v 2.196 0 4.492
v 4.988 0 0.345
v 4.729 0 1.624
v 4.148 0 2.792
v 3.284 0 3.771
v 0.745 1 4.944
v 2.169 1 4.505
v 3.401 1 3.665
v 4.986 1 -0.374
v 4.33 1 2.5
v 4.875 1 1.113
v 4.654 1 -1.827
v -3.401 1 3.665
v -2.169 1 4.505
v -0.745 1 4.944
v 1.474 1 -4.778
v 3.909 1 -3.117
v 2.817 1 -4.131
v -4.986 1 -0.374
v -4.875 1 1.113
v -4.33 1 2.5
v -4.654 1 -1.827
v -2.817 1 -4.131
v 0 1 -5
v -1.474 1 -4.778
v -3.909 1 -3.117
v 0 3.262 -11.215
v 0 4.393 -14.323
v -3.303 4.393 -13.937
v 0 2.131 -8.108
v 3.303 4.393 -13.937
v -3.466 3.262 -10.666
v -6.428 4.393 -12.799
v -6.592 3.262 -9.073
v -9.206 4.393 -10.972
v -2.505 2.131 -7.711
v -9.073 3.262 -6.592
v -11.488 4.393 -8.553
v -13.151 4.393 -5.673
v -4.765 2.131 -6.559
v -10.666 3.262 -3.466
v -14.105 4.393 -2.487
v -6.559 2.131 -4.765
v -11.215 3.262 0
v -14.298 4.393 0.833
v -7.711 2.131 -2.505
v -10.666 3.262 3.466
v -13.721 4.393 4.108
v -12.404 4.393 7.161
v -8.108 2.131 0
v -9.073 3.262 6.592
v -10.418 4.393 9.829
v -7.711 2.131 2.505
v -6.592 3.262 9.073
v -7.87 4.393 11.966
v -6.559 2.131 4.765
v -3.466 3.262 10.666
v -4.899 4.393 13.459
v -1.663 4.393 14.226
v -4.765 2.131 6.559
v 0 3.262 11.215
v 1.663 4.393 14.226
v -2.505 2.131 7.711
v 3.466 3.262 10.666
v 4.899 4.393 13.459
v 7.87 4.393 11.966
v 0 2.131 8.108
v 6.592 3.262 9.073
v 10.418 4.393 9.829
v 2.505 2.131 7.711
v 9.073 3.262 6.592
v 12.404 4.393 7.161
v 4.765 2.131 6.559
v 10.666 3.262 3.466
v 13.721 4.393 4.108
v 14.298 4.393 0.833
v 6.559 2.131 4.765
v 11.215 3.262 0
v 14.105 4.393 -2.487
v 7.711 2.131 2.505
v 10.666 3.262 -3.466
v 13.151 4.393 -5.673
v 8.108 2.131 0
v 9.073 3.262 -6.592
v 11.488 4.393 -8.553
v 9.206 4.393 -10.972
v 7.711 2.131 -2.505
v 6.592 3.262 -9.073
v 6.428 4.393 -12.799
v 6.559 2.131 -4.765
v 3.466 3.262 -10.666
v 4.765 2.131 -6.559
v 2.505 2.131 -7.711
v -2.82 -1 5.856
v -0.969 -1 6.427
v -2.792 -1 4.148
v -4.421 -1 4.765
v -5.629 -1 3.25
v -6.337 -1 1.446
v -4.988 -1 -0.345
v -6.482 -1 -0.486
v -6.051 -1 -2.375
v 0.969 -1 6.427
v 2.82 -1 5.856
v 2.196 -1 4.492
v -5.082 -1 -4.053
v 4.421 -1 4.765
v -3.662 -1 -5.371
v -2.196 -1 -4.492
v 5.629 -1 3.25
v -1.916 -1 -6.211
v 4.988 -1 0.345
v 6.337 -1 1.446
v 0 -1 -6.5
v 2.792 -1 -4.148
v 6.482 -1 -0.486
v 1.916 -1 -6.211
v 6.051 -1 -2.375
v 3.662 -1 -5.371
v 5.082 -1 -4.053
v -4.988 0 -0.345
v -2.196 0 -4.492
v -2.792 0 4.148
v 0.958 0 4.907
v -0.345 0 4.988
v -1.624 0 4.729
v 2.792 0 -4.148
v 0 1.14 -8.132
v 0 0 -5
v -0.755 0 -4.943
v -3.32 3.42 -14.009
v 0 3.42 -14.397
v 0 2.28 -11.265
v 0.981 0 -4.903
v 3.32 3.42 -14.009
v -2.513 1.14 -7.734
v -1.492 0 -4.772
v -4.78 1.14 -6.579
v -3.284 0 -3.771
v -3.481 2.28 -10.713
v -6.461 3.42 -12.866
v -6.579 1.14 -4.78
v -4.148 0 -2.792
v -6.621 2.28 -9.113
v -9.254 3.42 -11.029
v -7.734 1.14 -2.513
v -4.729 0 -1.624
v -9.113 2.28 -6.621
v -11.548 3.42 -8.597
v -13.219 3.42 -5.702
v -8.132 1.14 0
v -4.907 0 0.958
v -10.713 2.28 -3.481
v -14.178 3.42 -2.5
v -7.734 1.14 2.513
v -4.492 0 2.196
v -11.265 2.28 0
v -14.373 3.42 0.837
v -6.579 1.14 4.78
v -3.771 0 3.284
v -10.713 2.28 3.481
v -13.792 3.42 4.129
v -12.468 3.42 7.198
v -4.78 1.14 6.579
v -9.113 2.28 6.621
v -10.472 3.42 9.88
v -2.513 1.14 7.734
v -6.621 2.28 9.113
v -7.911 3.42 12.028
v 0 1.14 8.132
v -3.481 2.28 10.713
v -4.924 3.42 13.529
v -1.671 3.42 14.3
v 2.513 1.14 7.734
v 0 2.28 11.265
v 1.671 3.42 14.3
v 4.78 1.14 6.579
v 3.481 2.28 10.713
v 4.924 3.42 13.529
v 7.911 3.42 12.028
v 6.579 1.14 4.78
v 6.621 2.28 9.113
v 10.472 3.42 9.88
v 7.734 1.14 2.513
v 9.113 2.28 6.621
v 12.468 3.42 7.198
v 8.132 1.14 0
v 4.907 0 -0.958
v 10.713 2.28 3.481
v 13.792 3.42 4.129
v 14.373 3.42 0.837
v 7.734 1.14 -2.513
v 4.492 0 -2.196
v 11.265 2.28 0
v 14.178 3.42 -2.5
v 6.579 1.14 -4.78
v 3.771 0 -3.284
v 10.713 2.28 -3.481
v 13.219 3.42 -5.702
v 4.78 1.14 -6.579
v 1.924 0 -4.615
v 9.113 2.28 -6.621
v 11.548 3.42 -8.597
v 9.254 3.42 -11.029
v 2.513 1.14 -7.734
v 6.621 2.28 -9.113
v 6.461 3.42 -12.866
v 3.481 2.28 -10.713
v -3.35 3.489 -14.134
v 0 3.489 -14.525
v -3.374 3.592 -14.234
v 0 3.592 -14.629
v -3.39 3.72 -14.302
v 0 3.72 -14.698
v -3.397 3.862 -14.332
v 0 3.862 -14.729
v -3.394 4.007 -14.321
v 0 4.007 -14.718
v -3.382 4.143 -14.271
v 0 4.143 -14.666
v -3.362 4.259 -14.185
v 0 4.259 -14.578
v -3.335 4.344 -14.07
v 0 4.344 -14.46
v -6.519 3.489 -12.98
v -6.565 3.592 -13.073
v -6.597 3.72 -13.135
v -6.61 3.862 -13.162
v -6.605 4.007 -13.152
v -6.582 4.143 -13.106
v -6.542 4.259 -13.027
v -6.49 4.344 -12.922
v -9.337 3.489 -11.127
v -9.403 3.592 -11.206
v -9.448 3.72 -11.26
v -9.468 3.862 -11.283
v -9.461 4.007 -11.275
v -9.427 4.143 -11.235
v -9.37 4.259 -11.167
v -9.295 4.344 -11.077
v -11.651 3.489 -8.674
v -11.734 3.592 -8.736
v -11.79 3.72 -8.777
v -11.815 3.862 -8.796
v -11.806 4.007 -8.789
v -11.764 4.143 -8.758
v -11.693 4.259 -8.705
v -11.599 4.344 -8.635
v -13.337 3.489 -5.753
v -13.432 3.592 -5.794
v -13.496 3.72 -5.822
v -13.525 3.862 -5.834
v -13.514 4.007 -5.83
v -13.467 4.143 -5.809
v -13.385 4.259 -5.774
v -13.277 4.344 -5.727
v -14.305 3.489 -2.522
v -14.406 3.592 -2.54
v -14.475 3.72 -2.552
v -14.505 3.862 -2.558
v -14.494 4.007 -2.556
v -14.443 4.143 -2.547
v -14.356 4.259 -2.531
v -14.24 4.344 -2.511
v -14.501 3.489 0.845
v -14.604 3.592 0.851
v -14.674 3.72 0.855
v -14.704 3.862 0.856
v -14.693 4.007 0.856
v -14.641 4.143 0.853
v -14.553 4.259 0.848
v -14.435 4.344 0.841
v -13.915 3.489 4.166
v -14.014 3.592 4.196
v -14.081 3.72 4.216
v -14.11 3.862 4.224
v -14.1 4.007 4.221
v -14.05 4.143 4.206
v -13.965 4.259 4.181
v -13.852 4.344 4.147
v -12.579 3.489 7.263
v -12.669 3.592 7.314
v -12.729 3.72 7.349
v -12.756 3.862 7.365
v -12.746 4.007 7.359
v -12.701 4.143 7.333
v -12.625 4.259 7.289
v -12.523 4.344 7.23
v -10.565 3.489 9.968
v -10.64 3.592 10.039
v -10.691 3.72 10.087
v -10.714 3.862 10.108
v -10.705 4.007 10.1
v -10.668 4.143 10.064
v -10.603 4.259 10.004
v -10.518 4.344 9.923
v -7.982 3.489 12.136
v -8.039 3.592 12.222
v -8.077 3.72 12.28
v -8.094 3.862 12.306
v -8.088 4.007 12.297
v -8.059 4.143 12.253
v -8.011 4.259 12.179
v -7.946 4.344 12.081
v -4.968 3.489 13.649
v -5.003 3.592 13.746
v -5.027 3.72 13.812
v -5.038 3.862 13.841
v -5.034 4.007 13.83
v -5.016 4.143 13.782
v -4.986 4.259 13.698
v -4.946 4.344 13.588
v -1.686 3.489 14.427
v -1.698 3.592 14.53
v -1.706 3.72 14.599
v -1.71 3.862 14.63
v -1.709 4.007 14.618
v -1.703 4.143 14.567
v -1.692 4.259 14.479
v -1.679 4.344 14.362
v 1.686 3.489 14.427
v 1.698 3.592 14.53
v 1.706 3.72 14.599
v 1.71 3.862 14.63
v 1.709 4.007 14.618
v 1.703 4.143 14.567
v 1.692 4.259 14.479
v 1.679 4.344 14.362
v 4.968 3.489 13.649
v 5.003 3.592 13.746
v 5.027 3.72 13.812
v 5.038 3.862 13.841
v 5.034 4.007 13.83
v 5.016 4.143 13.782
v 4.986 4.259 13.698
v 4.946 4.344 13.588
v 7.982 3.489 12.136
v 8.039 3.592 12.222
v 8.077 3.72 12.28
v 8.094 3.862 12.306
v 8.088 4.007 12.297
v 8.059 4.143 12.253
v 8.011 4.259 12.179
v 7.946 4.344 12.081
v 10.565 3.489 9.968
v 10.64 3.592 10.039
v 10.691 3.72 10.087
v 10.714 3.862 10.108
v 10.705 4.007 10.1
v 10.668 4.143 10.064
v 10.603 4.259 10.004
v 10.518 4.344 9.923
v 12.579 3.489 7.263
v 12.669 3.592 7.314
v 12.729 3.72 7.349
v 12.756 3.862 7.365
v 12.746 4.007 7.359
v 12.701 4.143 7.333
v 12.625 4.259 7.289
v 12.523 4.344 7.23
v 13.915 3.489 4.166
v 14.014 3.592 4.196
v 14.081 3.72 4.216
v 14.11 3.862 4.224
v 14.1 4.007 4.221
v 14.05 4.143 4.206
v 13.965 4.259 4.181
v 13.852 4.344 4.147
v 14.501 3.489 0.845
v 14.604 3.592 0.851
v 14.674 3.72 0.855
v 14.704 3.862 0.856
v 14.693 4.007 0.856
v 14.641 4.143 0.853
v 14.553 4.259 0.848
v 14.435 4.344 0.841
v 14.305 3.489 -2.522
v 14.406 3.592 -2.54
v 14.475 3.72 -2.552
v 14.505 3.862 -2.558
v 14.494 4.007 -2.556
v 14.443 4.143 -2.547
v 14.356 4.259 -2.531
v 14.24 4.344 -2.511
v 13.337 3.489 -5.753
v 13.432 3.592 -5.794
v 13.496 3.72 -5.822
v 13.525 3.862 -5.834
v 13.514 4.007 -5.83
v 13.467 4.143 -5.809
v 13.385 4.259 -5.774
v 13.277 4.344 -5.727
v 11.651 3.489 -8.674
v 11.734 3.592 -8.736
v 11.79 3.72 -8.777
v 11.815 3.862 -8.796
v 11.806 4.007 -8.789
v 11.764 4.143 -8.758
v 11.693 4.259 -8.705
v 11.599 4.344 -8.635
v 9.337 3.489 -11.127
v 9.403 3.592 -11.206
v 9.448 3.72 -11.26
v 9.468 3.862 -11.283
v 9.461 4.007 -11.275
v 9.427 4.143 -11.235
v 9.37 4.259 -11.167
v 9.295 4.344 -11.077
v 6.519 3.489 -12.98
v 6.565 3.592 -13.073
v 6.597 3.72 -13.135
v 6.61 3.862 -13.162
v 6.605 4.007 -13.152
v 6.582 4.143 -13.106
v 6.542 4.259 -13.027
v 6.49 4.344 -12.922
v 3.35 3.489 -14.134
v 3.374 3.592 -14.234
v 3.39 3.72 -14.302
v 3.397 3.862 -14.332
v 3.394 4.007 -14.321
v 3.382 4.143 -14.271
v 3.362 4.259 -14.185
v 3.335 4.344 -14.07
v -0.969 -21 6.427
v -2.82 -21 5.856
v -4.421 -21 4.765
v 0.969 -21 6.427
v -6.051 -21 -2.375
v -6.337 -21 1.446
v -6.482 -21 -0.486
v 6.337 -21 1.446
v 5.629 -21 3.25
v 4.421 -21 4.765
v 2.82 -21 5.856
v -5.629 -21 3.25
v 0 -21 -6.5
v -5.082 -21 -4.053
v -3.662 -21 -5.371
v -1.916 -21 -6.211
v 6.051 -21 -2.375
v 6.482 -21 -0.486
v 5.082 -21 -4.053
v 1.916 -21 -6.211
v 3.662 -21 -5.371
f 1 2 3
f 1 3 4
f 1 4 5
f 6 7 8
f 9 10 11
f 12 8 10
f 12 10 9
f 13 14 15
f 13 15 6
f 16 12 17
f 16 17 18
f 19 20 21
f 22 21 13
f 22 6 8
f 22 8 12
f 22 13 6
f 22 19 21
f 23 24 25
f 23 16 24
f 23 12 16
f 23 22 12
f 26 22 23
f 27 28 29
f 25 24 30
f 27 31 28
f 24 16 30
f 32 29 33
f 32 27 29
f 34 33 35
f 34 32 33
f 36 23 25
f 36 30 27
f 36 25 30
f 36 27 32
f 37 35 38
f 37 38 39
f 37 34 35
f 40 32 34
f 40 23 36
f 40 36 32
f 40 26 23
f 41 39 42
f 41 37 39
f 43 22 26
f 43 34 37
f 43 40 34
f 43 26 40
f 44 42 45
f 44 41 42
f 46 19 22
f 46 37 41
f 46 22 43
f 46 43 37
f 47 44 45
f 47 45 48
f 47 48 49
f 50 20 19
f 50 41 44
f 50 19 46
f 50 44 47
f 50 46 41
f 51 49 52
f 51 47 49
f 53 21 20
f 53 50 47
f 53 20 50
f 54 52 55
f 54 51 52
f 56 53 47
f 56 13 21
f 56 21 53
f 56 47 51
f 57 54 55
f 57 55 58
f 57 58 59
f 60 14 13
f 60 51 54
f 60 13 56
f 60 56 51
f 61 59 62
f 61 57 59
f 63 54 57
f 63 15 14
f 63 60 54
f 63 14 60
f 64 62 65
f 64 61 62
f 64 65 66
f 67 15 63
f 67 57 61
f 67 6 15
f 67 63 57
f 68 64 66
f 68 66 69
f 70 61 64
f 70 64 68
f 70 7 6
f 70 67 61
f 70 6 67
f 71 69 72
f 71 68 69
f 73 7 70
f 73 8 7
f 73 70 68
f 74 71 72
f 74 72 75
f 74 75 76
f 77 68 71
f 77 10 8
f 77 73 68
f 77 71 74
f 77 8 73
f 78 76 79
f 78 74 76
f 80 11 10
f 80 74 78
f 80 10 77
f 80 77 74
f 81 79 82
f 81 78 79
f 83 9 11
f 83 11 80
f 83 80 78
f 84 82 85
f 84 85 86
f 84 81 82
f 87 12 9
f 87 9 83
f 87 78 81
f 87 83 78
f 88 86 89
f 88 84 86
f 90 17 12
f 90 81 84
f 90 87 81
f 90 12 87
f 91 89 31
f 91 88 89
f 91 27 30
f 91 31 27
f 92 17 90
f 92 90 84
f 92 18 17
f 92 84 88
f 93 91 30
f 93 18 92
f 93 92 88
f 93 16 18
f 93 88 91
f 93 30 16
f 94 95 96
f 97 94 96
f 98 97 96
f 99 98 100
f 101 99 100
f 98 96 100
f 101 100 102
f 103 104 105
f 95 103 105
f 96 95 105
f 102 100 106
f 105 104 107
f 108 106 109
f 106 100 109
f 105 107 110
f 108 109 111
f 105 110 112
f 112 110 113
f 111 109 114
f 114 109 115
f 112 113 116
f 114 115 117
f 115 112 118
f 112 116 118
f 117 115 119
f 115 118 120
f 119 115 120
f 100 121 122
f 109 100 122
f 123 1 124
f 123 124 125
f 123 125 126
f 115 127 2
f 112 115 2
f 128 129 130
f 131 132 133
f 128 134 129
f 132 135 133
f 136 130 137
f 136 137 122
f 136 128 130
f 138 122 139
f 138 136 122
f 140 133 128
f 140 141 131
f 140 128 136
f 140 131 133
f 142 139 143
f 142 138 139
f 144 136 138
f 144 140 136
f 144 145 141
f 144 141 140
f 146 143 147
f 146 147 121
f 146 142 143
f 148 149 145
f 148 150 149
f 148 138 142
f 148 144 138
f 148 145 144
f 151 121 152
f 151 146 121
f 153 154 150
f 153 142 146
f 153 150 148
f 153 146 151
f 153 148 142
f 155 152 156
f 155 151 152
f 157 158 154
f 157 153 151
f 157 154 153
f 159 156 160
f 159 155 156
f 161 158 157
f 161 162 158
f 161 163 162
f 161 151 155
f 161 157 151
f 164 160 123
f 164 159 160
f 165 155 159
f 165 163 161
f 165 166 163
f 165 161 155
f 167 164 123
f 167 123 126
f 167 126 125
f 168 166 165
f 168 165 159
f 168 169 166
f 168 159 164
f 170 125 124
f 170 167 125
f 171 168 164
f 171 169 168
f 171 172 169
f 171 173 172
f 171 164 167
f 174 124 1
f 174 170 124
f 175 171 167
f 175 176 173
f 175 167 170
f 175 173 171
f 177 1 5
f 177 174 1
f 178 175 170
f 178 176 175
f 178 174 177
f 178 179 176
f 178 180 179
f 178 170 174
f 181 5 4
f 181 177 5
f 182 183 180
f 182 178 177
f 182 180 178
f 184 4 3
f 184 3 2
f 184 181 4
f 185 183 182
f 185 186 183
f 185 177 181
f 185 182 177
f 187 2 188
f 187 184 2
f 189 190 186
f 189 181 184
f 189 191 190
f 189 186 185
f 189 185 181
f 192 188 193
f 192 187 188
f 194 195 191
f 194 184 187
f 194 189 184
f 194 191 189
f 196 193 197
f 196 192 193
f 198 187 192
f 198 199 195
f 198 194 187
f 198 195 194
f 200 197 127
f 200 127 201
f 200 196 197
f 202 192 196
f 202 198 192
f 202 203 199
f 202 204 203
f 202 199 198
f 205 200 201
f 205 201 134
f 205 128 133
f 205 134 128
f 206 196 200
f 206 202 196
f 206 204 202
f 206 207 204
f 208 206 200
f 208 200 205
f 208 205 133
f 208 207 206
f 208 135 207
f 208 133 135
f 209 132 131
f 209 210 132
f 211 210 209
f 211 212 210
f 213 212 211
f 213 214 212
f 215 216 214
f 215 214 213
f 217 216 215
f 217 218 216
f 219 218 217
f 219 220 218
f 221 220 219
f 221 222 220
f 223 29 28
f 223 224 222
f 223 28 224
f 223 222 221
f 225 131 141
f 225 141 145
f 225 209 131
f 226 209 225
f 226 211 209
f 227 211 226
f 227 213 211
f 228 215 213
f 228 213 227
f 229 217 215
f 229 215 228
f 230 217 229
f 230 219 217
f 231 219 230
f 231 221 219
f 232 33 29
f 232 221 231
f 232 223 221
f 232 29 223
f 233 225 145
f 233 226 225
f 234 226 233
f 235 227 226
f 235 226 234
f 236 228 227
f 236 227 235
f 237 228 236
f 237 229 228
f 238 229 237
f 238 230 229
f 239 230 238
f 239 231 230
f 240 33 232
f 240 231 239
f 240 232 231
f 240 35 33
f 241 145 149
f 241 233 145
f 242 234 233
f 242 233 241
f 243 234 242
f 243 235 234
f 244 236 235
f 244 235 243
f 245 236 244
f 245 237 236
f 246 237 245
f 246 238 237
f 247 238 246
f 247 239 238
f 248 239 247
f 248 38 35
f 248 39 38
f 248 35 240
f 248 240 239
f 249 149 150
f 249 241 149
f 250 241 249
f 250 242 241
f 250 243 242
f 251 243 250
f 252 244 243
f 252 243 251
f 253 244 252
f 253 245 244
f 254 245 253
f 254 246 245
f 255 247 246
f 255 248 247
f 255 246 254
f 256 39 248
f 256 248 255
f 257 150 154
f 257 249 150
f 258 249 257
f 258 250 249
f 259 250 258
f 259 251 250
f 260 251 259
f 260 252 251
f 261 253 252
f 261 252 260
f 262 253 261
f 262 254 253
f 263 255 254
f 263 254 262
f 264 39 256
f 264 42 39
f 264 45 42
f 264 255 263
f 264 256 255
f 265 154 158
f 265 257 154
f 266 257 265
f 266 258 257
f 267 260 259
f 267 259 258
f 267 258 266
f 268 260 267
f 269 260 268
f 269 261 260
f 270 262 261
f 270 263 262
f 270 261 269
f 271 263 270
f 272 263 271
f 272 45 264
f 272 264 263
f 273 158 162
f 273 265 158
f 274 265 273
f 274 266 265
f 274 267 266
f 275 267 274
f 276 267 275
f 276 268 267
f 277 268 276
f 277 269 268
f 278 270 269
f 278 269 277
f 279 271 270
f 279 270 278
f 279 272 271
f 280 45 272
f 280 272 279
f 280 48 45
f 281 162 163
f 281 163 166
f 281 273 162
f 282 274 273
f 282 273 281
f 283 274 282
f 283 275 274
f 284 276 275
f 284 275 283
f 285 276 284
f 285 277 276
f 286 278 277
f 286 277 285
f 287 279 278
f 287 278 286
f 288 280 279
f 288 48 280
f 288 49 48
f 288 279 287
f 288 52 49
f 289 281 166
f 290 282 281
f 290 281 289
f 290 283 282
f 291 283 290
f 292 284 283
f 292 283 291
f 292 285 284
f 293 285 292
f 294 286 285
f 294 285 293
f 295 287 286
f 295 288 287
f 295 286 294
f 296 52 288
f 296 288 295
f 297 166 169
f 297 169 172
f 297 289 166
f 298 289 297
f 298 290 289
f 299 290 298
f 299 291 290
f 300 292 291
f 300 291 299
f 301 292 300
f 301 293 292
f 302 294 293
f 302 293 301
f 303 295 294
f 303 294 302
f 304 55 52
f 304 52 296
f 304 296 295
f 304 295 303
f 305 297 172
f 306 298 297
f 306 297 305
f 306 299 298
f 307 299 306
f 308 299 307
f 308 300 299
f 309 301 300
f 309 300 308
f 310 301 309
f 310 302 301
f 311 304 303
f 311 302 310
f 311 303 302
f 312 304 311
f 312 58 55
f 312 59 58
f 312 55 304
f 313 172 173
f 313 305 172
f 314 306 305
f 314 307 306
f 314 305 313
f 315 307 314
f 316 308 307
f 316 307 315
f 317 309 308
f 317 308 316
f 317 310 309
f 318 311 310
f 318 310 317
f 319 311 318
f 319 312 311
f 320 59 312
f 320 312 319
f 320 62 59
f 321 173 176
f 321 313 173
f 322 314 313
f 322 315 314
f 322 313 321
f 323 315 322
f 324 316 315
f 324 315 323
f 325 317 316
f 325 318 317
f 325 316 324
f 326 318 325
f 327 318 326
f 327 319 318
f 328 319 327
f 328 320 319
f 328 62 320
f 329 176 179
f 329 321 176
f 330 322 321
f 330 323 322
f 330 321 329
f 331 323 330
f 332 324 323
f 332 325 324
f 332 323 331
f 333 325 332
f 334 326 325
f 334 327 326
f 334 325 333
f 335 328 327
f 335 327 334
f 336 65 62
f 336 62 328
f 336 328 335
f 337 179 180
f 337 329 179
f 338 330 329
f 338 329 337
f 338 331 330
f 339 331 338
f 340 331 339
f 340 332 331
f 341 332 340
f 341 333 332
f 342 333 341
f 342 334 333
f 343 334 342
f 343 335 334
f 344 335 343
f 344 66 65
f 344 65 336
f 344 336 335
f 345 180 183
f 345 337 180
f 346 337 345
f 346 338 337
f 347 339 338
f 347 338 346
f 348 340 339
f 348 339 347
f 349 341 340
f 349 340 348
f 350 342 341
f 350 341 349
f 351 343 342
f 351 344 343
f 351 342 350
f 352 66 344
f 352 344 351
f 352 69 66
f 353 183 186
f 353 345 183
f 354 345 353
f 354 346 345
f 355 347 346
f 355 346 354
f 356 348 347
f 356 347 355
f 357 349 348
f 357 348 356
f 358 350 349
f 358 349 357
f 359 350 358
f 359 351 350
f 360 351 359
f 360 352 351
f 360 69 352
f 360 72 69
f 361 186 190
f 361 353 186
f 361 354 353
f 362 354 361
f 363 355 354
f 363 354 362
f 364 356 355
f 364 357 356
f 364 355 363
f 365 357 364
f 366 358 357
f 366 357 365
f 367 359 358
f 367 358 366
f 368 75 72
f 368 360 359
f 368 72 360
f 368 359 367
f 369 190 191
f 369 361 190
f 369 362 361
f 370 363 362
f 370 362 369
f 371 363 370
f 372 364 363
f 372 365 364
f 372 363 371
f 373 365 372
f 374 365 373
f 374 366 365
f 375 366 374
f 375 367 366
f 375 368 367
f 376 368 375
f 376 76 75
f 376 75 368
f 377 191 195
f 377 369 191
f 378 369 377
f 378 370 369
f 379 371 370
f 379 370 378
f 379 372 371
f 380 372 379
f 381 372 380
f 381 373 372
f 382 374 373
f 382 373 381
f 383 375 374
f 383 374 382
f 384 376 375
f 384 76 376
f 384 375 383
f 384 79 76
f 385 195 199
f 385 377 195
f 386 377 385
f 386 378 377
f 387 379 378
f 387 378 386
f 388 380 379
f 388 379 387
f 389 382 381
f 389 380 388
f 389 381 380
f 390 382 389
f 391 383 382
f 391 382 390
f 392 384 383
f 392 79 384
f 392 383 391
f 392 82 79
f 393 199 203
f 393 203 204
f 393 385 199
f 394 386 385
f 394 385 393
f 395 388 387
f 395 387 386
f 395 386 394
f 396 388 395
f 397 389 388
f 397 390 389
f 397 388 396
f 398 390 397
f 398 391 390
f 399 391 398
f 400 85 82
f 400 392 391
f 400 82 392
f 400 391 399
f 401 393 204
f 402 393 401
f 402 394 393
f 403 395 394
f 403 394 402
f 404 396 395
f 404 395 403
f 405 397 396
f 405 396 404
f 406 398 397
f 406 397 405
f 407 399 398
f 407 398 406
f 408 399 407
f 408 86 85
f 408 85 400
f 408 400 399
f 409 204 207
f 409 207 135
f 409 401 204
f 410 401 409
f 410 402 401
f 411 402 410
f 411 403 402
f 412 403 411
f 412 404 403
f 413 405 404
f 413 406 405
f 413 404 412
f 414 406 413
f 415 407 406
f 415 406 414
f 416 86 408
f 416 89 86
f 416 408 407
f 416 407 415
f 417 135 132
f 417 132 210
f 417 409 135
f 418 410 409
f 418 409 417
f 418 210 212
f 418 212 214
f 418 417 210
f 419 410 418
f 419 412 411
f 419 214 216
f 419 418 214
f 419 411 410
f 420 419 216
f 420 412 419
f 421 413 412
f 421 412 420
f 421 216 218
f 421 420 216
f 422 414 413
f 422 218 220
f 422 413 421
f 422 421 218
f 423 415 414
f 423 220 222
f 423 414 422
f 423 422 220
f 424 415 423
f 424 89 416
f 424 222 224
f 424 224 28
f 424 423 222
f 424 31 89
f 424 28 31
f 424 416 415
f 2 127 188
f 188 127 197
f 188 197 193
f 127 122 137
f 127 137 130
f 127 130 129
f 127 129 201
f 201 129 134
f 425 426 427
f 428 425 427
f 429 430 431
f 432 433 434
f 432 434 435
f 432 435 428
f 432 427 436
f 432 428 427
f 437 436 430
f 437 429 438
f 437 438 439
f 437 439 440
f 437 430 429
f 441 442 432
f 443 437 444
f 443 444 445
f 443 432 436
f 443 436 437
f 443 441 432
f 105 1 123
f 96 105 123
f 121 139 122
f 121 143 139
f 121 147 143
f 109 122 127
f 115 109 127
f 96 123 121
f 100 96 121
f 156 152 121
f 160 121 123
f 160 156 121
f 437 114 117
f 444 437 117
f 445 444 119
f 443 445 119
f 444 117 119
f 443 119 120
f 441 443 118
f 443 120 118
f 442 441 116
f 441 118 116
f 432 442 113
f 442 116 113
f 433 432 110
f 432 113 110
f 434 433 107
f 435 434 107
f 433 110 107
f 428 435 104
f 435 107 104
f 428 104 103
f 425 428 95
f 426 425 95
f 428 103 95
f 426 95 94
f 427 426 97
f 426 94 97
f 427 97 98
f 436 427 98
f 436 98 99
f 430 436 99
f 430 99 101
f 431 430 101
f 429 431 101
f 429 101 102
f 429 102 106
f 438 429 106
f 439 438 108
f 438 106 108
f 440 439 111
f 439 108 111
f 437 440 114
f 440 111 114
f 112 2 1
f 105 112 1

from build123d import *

# Parameters (mm, degrees)
BOSS_EXTRU_1_DEPTH  = 1
SKETCH1_R           = 6.5
BOSS_EXTRUDE1_DEPTH = 20


with BuildPart() as part:
    # Esquisse1 → Révolution1 (revolve)
    with BuildSketch(Plane.XY, mode=Mode.PRIVATE) as r_volution1_sk:
        with BuildLine():
            Line((0, 0), (5, 0))
            Line((5, 0), (14.396926208, 3.420201433))
            ThreePointArc((14.396926208, 3.420201433), (14.728803197, 3.934870166), (14.322587886, 4.393144497))
            Line((14.322587886, 4.393144497), (5, 1))
            Line((5, 1), (0, 1))
            Line((0, 1), (0, 0))
        make_face()
    revolve(r_volution1_sk.sketch.rotate(Axis((0, 0, 0), (0, 1, 0)), 90), axis=Axis((0, 0, 0), (0, 1, 0)))

    # Esquisse2 → Boss.-Extru.1 (add)
    with BuildSketch(Plane.XZ):
        Polygon((2.792425312, -4.14757289), (4.988116143, 0.344524813), (2.195690831, 4.492097703), (-2.792425312, 4.14757289), (-4.988116143, -0.344524813), (-2.195690831, -4.492097703), align=None)
    extrude(amount=BOSS_EXTRU_1_DEPTH)

    # Sketch1 → Boss-Extrude1 (add)
    with BuildSketch(Plane.XZ.offset(1)):
        with Locations(Location((0, 0, 0), (0, 0, 270))):
            Circle(SKETCH1_R)
    extrude(amount=BOSS_EXTRUDE1_DEPTH)


solid = part.part
